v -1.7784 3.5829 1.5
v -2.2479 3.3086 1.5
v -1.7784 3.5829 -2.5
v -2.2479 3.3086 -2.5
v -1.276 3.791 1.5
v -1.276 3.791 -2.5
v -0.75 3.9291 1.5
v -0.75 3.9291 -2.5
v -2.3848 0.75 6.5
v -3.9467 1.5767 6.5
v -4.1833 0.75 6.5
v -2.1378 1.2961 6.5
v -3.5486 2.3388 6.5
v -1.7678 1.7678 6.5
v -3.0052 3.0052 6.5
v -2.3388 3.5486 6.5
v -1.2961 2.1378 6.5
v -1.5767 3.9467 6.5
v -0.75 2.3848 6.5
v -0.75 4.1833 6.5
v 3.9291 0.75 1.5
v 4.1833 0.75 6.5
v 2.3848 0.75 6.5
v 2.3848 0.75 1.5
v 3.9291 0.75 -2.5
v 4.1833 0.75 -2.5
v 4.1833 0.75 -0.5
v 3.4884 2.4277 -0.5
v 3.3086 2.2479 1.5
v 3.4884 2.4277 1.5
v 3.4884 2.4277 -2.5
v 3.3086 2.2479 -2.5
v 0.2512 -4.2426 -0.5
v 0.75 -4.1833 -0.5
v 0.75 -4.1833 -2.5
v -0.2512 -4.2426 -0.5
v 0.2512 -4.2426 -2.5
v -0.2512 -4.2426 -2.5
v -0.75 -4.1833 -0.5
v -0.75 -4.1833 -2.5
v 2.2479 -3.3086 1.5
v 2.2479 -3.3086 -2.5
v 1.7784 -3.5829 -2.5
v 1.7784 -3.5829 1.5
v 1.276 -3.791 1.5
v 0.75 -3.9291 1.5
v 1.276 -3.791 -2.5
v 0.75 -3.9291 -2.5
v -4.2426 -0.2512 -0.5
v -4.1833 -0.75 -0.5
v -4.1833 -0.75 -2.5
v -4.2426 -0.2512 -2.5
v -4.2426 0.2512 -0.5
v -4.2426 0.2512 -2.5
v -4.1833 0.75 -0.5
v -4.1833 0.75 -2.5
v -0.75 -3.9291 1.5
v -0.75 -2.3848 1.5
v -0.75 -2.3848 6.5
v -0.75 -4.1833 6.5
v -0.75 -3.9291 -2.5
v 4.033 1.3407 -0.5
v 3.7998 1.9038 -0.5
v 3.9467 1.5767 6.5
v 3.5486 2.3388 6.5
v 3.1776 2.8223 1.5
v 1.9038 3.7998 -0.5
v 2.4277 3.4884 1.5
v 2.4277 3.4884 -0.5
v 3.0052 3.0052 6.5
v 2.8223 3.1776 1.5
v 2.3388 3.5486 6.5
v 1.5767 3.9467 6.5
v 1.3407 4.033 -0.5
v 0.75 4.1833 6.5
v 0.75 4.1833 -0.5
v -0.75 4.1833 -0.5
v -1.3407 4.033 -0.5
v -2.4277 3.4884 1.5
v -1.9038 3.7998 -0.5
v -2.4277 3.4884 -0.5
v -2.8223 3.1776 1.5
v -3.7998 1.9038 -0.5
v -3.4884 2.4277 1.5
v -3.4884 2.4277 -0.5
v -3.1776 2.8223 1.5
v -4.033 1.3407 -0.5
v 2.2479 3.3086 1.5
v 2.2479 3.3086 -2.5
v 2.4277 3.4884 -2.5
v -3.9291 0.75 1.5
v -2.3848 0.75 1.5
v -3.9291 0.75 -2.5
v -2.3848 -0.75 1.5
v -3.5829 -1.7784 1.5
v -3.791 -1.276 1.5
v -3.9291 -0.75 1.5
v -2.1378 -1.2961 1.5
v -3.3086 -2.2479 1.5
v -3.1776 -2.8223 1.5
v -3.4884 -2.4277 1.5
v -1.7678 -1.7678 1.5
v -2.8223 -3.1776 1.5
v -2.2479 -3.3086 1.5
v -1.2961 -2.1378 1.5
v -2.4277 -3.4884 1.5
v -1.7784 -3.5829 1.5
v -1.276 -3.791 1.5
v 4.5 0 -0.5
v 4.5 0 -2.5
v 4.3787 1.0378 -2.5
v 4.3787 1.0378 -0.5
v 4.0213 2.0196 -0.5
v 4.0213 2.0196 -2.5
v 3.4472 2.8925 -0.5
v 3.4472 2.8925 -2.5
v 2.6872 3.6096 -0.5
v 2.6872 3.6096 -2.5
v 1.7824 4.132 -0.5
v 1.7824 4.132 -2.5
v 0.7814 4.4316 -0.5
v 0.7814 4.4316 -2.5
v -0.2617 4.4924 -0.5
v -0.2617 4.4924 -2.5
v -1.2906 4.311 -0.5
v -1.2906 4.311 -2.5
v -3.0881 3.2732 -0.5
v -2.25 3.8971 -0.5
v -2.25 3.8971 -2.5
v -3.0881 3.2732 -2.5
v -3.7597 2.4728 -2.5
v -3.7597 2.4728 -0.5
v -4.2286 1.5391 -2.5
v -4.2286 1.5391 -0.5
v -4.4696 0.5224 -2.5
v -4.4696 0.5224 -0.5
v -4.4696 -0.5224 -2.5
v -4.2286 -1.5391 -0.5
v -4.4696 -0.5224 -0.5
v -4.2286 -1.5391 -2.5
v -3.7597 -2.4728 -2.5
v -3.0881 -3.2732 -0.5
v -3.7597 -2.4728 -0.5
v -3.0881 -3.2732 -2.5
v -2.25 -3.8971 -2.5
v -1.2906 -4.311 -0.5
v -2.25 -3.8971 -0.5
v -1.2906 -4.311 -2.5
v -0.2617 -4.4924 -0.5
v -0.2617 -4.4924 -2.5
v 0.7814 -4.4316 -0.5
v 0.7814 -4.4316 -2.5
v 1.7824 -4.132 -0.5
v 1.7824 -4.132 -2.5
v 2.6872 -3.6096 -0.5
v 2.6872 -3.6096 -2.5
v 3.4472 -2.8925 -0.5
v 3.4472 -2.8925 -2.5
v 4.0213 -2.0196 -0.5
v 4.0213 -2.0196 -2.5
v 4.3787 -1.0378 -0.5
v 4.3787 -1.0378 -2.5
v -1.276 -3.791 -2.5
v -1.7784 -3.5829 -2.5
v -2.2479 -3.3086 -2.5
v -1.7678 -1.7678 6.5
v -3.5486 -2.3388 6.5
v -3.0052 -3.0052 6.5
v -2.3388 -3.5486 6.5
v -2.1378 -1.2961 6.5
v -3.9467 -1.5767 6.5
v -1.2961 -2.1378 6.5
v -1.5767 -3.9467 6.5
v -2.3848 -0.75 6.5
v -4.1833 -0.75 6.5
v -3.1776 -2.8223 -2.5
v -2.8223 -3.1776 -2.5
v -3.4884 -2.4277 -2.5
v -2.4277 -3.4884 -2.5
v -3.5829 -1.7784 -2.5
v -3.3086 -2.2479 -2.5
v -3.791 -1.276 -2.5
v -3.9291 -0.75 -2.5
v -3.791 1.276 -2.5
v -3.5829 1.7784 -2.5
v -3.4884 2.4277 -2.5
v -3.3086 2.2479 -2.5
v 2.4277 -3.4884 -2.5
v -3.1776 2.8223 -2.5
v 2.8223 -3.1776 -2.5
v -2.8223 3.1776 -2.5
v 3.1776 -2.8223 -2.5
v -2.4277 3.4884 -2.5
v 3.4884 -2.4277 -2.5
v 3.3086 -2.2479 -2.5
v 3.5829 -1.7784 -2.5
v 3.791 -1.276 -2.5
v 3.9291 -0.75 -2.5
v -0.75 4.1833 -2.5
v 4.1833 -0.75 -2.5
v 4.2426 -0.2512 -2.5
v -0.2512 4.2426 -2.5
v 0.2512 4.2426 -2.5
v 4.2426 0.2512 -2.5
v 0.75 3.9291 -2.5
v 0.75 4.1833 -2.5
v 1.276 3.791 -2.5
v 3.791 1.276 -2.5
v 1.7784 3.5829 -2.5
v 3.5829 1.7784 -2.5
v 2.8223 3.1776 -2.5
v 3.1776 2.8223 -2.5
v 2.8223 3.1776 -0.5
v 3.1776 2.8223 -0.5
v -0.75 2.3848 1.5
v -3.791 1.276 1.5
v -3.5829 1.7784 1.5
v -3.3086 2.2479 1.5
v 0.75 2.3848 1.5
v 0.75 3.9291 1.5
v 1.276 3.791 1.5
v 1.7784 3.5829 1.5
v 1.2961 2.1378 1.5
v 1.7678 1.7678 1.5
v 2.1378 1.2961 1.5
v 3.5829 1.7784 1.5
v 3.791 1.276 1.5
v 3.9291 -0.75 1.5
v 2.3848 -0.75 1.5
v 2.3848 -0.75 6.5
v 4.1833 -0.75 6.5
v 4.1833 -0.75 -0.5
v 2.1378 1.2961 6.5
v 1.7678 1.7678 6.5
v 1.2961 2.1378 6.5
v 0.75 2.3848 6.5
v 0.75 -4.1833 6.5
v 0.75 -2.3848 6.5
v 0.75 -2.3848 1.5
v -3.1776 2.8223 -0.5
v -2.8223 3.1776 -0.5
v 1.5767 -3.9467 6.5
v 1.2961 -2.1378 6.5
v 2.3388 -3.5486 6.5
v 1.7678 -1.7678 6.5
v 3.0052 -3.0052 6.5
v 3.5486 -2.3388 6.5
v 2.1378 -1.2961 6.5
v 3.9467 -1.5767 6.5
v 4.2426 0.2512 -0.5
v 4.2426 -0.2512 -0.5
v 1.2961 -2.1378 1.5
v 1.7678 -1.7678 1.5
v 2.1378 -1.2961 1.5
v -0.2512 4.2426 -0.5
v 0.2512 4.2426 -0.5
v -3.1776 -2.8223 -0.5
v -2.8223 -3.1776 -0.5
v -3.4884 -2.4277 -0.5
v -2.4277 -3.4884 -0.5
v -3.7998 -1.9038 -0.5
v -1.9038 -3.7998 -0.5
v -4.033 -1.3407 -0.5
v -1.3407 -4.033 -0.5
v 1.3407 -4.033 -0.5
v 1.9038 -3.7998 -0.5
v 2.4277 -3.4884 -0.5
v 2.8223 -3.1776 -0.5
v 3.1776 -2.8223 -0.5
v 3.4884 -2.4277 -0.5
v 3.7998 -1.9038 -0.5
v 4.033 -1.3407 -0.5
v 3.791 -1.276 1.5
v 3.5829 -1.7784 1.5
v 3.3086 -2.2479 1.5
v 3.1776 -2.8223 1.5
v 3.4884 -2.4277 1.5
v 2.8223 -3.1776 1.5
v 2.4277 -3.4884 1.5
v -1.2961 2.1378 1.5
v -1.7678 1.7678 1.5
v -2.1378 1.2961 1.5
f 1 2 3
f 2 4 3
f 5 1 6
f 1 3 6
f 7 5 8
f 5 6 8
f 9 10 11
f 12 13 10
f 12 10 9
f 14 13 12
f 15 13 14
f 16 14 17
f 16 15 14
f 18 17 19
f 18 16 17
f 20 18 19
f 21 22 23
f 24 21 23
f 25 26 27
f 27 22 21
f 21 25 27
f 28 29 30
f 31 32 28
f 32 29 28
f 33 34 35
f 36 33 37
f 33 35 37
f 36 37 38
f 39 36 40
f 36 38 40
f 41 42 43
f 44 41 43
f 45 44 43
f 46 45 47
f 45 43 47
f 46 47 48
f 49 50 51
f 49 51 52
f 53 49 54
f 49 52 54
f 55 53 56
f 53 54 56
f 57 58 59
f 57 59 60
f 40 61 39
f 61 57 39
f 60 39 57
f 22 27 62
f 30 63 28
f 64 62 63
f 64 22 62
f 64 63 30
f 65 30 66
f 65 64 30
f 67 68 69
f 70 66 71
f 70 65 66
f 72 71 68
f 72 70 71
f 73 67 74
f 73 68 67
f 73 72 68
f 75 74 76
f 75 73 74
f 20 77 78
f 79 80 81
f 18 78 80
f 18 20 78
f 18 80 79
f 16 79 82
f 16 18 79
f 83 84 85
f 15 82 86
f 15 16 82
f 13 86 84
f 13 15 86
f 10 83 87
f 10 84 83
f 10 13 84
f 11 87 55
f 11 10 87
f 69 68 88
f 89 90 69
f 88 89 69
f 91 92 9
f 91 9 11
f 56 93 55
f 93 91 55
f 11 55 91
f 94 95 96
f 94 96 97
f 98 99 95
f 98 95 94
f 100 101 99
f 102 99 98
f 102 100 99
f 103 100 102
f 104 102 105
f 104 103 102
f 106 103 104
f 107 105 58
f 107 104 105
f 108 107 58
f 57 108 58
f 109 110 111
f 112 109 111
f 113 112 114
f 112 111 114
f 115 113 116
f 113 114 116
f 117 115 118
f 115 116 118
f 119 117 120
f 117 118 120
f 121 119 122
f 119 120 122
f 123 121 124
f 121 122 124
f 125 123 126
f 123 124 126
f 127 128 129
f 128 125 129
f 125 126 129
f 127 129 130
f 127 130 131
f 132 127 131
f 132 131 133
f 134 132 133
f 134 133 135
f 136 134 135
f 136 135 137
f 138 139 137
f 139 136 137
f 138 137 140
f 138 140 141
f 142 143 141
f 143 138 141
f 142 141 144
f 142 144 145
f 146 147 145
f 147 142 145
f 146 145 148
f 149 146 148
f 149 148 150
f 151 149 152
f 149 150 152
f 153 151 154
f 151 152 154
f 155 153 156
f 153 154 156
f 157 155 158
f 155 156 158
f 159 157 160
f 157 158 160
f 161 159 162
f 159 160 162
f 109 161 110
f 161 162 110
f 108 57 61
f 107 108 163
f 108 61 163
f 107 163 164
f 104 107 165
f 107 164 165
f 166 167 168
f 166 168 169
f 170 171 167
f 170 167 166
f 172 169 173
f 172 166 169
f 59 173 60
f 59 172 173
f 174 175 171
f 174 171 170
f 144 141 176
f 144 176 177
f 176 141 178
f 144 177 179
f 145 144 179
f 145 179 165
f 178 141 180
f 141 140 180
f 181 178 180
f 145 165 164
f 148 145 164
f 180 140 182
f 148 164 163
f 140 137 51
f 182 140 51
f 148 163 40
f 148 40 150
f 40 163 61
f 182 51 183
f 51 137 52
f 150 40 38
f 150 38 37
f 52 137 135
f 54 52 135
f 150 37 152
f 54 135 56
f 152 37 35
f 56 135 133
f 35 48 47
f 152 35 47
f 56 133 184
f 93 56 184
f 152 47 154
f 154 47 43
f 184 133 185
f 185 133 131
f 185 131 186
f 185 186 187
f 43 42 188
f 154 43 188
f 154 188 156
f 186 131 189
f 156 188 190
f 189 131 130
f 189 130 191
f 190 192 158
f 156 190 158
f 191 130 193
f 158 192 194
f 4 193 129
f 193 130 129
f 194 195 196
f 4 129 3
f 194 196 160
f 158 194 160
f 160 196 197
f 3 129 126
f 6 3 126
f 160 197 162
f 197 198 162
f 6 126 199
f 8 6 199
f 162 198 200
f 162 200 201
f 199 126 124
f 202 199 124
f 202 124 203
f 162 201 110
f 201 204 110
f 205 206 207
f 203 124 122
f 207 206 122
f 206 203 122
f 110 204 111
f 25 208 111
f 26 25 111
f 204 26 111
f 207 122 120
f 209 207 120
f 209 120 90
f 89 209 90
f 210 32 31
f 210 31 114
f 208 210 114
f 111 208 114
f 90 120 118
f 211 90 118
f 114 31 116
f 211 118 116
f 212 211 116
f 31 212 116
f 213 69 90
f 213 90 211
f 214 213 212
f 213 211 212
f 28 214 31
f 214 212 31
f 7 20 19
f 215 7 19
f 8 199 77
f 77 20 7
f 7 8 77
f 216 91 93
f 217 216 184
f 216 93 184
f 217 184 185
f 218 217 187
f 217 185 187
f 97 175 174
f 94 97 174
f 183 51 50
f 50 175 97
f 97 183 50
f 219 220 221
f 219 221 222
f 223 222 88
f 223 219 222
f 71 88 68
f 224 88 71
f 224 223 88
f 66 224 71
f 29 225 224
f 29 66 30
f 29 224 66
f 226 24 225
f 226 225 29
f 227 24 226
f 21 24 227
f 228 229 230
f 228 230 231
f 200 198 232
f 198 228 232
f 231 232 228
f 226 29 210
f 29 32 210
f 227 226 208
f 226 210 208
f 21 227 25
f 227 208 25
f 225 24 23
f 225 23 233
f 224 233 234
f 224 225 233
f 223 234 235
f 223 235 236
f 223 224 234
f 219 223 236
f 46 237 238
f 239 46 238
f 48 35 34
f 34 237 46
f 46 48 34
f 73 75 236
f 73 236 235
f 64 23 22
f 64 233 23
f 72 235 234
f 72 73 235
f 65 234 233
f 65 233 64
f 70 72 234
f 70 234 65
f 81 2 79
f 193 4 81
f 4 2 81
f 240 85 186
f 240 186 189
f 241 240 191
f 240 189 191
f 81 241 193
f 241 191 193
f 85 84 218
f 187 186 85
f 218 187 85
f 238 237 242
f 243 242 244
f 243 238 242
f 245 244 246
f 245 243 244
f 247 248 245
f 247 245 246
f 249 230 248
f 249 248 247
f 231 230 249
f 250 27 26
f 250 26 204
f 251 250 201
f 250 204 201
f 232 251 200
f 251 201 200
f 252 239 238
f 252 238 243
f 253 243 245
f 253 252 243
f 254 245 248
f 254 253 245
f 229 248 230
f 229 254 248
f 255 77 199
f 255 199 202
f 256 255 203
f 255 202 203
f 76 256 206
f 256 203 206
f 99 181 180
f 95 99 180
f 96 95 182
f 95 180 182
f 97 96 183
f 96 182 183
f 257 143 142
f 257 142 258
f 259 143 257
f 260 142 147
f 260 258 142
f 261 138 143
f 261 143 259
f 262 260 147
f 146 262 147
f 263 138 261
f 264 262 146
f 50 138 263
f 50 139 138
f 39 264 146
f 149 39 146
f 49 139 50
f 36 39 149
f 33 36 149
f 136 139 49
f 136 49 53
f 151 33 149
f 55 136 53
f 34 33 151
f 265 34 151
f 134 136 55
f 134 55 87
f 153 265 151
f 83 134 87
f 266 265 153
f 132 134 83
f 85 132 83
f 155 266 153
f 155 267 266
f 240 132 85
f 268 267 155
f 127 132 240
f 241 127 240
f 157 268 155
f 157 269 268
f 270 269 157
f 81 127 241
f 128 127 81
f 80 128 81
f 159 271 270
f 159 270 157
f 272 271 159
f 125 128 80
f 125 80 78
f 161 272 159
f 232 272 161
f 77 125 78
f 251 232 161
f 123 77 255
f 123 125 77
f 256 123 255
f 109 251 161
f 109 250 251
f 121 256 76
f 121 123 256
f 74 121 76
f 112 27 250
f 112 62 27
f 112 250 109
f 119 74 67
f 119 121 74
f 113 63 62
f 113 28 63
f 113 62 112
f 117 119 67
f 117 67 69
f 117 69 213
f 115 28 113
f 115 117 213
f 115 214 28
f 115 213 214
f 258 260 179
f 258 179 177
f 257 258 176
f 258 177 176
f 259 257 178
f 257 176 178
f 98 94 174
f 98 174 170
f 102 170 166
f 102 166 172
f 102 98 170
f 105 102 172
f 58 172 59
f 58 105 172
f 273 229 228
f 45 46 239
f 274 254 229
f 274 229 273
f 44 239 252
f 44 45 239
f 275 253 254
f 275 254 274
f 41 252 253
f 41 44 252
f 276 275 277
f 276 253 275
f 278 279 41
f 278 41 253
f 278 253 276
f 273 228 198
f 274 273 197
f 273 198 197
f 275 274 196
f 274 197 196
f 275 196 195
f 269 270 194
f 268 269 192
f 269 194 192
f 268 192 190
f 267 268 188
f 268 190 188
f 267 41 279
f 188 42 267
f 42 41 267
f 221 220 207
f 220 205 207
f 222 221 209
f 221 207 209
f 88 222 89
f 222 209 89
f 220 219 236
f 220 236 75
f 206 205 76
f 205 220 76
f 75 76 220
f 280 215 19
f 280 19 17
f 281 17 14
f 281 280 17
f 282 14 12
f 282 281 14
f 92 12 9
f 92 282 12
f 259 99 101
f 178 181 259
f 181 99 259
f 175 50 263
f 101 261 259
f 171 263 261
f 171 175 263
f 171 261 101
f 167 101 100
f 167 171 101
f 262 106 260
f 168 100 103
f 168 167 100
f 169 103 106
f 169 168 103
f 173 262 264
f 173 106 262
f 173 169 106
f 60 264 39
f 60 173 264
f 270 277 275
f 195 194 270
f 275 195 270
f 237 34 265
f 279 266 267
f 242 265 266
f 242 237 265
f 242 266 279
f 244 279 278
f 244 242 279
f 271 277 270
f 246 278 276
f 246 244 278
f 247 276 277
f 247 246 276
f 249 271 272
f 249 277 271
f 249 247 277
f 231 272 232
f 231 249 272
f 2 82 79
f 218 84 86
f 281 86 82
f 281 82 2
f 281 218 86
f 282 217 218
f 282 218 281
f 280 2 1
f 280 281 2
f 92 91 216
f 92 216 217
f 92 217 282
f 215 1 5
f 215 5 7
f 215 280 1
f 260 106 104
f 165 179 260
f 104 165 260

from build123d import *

# Parameters (mm, degrees)
SKETCH016_R     = 4.5
SKETCH016_R_2   = 2.5
PAD011_DEPTH    = 9
SKETCH018_R     = 5.465451
SKETCH018_R_2   = 4.25
POCKET006_DEPTH = 7
SKETCH019_R     = 4
POCKET007_DEPTH = 4
POCKET008_DEPTH = 9.001
POCKET009_DEPTH = 4


with BuildPart() as part:
    # Sketch016 → Pad011 (new body)
    with BuildSketch(Plane.XY):
        Circle(SKETCH016_R)
        Circle(SKETCH016_R_2, mode=Mode.SUBTRACT)
    extrude(amount=PAD011_DEPTH)

    # Sketch018 (on Face4 of Pad011) → Pocket006 (cut)
    with BuildSketch(Plane.XY.offset(9)):
        Circle(SKETCH018_R)
        Circle(SKETCH018_R_2, mode=Mode.SUBTRACT)
    extrude(amount=-POCKET006_DEPTH, mode=Mode.SUBTRACT)

    # Sketch019 (on Face2 of Pocket006) → Pocket007 (cut)
    with BuildSketch(Plane(origin=(0, 0, 0), x_dir=(1, 0, 0), z_dir=(0, 0, -1))):
        Circle(SKETCH019_R)
    extrude(amount=-POCKET007_DEPTH, mode=Mode.SUBTRACT)

    # Sketch020 (on Face2 of Pocket007) → Pocket008 (cut, through all)
    with BuildSketch(Plane(origin=(0, 0, 0), x_dir=(1, 0, 0), z_dir=(0, 0, -1))):
        with BuildLine():
            ThreePointArc((0.75, 4.1833001327), (0, 4.25), (-0.75, 4.1833001327))
            Line((-0.75, 0.75), (-0.75, 4.1833001327))
            Line((-4.1833001327, 0.75), (-0.75, 0.75))
            ThreePointArc((-4.1833001327, 0.75), (-4.25, 0), (-4.1833001327, -0.75))
            Line((-0.75, -0.75), (-4.1833001327, -0.75))
            Line((-0.75, -4.1833001327), (-0.75, -0.75))
            ThreePointArc((-0.75, -4.1833001327), (0, -4.25), (0.75, -4.1833001327))
            Line((0.75, -0.75), (0.75, -4.1833001327))
            Line((4.1833001327, -0.75), (0.75, -0.75))
            ThreePointArc((4.1833001327, -0.75), (4.25, 0), (4.1833001327, 0.75))
            Line((0.75, 0.75), (4.1833001327, 0.75))
            Line((0.75, 4.1833001327), (0.75, 0.75))
        make_face()
    extrude(amount=-POCKET008_DEPTH, mode=Mode.SUBTRACT)

    # Sketch021 (on Face2 of Pocket008) → Pocket009 (cut)
    with BuildSketch(Plane(origin=(0, 0, 0), x_dir=(0.7071067812, -0.7071067812, 0), z_dir=(0, 0, -1))):
        with BuildLine():
            ThreePointArc((0.75, 4.1833001327), (0, 4.25), (-0.75, 4.1833001327))
            Line((-0.75, 0.75), (-0.75, 4.1833001327))
            Line((-4.1833001327, 0.75), (-0.75, 0.75))
            ThreePointArc((-4.1833001327, 0.75), (-4.25, 0), (-4.1833001327, -0.75))
            Line((-0.75, -0.75), (-4.1833001327, -0.75))
            Line((-0.75, -4.1833001327), (-0.75, -0.75))
            ThreePointArc((-0.75, -4.1833001327), (0, -4.25), (0.75, -4.1833001327))
            Line((0.75, -0.75), (0.75, -4.1833001327))
            Line((4.1833001327, -0.75), (0.75, -0.75))
            ThreePointArc((4.1833001327, -0.75), (4.25, 0), (4.1833001327, 0.75))
            Line((0.75, 0.75), (4.1833001327, 0.75))
            Line((0.75, 4.1833001327), (0.75, 0.75))
        make_face()
    extrude(amount=-POCKET009_DEPTH, mode=Mode.SUBTRACT)


with BuildPart() as part_1:
    # Body006 placement: moved
    add(part.part.moved(Location((0, 0, -2.5))))


solid = part_1.part
